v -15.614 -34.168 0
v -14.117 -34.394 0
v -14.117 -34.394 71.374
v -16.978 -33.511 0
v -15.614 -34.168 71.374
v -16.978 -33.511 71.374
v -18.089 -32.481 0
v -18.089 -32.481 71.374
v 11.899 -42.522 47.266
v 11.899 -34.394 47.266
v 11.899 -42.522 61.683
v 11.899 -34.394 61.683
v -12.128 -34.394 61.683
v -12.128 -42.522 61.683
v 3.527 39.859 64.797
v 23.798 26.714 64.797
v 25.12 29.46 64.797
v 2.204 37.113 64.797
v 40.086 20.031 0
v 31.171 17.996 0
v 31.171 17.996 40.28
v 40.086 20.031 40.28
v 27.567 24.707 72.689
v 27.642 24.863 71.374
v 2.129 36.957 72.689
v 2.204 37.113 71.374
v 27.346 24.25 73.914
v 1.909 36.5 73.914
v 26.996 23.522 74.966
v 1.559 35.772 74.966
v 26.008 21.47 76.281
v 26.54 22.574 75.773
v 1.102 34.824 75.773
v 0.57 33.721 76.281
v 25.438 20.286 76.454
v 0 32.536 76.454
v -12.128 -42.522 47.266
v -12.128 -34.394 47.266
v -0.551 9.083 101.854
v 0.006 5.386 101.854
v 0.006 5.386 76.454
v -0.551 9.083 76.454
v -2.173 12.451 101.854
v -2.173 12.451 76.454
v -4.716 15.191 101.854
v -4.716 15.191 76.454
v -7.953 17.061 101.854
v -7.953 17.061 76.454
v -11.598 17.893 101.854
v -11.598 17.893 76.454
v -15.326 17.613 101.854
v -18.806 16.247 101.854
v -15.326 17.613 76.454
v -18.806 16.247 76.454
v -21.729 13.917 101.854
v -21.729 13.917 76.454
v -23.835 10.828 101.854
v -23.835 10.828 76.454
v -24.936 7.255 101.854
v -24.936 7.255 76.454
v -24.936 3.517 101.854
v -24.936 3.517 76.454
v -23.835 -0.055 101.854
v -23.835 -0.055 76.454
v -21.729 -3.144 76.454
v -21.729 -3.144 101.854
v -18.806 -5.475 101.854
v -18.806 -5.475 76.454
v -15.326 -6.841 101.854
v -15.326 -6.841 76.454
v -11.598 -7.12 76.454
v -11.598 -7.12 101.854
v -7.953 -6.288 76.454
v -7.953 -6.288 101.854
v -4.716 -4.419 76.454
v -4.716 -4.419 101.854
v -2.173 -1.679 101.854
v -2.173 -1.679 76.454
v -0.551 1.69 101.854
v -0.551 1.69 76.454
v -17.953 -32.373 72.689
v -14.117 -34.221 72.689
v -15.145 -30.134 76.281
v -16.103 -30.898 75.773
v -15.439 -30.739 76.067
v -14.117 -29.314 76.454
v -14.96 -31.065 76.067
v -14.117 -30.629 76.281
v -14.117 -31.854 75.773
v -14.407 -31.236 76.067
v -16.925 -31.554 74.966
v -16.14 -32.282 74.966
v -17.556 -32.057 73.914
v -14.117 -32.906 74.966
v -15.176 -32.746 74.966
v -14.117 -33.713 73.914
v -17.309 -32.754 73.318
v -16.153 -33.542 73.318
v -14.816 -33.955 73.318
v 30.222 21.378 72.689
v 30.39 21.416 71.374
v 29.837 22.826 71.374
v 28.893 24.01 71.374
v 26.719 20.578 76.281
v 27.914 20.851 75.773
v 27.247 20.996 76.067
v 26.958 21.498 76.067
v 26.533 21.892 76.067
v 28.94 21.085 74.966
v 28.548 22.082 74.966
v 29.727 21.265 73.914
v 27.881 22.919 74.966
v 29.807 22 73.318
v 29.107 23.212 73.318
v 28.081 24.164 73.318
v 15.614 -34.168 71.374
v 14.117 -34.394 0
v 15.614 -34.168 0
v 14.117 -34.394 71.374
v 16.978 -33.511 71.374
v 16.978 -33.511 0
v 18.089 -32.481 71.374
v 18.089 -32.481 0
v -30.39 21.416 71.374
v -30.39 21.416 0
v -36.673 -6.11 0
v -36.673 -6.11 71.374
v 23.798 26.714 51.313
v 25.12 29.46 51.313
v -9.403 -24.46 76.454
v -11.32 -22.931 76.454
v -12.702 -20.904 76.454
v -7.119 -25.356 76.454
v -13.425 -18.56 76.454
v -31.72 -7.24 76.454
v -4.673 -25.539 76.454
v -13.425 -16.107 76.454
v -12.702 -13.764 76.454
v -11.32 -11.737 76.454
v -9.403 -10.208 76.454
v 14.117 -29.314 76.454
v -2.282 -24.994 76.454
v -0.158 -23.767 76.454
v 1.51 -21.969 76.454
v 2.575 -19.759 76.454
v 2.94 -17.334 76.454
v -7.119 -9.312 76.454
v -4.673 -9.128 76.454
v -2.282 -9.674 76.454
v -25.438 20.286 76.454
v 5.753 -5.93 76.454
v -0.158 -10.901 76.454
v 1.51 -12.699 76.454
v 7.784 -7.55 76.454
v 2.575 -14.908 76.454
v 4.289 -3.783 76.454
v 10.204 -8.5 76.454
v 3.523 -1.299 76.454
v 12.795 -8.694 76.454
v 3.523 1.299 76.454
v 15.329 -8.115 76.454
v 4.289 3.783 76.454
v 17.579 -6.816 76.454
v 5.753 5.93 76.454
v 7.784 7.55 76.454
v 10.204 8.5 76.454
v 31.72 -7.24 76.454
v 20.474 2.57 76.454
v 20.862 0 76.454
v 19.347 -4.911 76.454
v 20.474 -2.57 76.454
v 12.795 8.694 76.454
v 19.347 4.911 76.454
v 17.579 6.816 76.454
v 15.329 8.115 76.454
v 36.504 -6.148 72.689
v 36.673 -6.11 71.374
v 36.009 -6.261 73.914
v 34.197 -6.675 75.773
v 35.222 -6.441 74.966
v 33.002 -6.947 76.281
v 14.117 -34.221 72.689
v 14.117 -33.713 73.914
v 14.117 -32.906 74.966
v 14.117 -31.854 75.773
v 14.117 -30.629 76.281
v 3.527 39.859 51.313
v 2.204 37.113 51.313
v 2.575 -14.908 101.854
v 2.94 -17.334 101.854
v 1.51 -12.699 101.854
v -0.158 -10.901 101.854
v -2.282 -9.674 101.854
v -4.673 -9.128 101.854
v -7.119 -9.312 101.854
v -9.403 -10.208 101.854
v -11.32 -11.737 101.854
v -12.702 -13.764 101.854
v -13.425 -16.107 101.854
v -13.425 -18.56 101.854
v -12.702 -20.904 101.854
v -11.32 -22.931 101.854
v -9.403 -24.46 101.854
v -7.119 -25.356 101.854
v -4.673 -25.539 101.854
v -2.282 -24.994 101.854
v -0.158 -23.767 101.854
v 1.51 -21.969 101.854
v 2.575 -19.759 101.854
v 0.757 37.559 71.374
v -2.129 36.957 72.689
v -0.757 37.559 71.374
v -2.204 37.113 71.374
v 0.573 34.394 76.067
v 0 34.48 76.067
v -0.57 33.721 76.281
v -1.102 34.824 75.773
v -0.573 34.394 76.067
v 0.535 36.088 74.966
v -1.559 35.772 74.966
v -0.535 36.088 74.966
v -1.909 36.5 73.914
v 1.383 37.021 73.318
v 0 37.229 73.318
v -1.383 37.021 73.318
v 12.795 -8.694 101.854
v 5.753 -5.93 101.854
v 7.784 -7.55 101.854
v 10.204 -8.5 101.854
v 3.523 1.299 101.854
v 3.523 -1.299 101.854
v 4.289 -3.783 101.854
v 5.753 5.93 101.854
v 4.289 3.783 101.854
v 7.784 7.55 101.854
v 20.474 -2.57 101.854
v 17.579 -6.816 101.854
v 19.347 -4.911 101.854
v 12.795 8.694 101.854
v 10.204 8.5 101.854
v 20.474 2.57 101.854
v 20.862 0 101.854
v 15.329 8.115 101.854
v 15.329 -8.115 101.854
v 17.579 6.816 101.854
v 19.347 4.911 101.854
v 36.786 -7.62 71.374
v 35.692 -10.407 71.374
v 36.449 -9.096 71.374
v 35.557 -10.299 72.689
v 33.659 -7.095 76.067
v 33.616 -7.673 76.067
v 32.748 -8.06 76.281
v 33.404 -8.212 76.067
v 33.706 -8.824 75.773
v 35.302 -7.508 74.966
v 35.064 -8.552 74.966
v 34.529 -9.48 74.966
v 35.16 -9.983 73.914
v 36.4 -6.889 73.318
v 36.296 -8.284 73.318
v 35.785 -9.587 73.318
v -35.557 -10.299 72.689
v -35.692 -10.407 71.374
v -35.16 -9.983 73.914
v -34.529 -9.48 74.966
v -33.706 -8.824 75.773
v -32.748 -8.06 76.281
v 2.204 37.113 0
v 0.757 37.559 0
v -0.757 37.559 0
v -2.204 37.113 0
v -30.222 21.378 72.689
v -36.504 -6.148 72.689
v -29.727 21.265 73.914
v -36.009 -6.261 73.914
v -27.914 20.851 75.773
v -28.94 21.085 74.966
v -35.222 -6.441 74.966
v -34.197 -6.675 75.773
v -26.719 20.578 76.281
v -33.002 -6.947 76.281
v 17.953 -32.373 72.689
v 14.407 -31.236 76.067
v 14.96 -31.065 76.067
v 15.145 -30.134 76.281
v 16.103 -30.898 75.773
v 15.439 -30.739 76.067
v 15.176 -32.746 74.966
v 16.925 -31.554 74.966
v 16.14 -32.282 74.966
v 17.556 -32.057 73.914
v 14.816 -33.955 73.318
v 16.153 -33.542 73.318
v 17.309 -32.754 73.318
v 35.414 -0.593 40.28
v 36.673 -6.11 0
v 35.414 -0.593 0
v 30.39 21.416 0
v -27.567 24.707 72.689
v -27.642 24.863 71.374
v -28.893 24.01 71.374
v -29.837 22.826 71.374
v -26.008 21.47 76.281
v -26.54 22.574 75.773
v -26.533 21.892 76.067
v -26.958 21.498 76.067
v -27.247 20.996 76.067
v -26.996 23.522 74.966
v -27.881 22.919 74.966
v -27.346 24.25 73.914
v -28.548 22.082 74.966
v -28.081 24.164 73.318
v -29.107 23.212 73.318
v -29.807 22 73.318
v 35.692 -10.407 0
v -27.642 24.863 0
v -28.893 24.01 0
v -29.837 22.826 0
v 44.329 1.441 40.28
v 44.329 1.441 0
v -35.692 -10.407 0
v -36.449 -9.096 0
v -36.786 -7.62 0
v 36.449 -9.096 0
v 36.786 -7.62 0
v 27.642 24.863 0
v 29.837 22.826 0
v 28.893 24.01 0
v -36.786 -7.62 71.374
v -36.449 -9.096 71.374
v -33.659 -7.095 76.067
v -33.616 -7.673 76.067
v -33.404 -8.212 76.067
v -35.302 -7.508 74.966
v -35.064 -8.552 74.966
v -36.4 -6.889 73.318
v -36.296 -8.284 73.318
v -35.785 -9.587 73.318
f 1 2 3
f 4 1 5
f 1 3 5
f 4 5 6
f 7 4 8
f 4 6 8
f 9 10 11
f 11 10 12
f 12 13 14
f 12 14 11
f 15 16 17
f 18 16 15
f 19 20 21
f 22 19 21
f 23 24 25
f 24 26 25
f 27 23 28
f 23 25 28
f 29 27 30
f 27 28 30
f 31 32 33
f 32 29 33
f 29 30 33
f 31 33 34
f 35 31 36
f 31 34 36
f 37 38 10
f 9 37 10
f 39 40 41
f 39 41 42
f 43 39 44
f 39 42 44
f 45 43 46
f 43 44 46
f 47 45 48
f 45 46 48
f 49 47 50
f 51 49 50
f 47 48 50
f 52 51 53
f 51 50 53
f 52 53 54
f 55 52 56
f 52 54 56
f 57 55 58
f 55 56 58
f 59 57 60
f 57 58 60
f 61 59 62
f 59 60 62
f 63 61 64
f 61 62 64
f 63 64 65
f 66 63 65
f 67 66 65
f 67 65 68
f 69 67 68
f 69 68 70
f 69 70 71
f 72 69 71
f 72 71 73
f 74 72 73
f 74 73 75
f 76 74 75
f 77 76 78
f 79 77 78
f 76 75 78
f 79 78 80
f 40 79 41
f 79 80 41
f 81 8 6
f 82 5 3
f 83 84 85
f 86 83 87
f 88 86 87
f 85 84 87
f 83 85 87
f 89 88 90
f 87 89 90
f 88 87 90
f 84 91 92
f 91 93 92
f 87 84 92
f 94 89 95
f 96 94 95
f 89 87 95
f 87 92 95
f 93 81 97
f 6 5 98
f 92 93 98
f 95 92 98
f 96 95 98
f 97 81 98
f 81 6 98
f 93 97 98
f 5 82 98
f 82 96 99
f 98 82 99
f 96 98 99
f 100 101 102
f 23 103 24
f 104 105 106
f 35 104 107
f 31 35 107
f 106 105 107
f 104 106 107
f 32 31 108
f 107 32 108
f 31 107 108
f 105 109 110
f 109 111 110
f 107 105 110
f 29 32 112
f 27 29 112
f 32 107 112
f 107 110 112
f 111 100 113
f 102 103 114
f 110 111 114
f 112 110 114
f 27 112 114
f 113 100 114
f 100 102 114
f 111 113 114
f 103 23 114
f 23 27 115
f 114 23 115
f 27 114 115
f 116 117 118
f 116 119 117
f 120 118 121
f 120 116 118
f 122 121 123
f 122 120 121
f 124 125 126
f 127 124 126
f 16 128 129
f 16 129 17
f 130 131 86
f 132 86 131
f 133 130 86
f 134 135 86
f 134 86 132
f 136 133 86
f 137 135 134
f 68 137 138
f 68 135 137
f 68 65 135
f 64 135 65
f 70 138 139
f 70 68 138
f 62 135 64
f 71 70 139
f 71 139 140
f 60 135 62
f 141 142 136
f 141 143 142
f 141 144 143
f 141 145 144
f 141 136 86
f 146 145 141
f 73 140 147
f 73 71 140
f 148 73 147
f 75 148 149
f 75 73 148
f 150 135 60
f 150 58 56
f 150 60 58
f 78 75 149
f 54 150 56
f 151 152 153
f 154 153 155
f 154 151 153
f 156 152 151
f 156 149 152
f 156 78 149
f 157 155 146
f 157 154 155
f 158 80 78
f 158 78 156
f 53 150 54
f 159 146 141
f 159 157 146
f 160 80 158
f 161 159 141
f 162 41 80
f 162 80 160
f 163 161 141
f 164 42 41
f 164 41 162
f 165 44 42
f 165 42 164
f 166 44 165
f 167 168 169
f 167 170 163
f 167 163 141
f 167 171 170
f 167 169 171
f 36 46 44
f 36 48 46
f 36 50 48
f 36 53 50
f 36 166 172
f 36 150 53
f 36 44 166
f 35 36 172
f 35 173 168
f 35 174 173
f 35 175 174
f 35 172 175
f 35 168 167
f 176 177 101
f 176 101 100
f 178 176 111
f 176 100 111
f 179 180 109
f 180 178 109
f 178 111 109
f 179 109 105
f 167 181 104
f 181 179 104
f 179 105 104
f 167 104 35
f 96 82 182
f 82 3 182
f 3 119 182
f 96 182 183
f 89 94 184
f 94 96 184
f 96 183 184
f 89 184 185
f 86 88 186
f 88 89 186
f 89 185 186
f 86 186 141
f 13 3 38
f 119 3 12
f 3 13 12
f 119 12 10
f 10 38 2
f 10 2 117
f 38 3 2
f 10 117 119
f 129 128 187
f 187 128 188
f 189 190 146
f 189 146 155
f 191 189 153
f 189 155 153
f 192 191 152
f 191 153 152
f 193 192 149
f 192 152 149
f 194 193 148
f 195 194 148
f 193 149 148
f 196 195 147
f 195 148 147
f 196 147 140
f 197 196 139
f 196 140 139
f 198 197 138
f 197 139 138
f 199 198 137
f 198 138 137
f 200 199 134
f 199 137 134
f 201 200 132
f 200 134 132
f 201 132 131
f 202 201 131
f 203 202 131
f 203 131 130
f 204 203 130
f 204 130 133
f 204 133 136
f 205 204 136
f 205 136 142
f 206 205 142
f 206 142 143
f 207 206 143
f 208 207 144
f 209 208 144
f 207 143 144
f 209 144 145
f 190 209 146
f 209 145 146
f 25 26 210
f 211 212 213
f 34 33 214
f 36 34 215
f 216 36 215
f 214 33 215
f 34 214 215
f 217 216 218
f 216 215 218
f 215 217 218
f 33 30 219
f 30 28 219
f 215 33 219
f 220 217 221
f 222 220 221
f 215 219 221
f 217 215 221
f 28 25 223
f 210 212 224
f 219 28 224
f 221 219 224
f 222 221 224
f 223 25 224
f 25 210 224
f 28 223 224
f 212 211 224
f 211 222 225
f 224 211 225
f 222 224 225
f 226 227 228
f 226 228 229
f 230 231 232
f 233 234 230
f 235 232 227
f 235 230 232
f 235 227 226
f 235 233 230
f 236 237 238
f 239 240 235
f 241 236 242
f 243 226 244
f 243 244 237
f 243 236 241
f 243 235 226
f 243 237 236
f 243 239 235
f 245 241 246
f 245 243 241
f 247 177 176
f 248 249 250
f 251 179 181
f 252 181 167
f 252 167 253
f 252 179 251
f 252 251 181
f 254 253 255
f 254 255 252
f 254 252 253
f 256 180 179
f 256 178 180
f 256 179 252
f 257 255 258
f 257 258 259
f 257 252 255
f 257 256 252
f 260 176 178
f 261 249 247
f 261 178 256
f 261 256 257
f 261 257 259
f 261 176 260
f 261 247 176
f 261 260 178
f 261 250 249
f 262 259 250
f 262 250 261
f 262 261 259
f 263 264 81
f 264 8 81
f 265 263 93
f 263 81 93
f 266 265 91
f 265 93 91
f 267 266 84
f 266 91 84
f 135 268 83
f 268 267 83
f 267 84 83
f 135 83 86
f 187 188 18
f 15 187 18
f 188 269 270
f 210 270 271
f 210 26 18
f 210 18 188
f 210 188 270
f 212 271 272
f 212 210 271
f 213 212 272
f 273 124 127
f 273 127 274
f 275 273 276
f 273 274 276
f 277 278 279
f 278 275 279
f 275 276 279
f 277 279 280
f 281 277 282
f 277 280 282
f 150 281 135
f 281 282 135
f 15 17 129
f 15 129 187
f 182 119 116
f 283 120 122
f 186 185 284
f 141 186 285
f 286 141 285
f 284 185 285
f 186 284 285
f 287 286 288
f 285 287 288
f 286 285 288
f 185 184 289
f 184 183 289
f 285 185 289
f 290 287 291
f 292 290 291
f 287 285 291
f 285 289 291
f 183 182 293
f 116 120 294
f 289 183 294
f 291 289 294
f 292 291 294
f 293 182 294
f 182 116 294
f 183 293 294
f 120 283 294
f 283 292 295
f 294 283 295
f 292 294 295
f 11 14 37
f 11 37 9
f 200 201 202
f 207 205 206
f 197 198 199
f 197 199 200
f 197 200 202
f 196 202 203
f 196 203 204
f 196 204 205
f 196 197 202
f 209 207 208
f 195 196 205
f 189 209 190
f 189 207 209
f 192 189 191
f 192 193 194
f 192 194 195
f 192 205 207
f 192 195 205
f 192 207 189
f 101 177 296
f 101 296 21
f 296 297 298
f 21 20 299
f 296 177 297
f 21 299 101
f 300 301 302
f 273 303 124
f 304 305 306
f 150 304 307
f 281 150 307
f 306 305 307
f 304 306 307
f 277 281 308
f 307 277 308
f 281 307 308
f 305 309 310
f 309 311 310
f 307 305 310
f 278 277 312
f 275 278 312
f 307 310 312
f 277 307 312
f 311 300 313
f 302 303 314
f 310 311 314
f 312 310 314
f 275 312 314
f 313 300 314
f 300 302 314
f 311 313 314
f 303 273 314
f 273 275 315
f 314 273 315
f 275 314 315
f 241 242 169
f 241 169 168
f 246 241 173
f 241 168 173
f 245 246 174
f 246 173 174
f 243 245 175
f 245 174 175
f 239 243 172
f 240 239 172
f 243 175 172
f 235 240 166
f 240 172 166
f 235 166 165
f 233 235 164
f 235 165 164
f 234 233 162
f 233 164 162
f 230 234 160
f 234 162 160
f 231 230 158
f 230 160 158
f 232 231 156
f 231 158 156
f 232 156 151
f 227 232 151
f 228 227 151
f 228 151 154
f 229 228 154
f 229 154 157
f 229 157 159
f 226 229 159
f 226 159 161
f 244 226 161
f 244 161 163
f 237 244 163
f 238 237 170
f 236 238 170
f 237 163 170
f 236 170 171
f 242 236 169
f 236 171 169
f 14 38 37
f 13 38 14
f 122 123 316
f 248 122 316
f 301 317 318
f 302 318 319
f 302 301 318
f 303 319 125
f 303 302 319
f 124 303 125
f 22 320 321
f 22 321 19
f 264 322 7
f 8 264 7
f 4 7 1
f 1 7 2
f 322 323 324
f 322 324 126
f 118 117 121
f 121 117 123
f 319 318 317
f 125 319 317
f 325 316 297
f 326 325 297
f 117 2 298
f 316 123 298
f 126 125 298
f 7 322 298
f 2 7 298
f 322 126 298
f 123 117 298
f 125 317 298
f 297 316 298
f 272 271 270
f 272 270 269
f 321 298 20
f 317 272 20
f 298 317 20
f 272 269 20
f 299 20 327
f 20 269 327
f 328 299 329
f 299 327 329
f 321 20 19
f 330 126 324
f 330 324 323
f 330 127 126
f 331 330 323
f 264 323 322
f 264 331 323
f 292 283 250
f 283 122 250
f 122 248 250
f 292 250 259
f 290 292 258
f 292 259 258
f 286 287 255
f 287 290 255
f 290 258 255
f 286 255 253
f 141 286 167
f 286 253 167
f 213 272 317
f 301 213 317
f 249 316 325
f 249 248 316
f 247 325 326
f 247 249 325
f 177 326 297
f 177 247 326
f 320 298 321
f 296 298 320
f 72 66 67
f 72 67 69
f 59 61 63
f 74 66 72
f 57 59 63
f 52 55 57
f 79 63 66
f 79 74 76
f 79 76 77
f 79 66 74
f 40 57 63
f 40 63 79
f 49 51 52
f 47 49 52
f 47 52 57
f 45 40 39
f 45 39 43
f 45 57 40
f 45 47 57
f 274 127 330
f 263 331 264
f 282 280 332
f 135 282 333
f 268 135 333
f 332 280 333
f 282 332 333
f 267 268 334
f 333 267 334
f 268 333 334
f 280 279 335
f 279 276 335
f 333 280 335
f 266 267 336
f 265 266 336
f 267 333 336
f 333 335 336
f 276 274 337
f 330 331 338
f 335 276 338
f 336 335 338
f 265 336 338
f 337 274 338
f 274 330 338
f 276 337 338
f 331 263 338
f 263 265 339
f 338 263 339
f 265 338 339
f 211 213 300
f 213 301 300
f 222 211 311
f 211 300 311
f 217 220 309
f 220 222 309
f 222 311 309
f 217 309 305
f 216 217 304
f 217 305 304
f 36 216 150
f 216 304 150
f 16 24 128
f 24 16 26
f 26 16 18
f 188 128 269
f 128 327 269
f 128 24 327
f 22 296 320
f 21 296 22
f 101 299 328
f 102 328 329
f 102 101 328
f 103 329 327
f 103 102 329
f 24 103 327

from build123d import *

# Parameters (mm, degrees)
F1_DEPTH  = 76.454
F2_R      = 5.08
F3_R      = 12.5413462947
F3_R_2    = 8.7181007295
F3_R_3    = 8.2285725293
F4_DEPTH  = 25.4
F5_W      = 19.0680492669
F5_H      = 40.280263871
F6_DEPTH  = 9.144
F7_W      = 23.966927348
F7_H      = 13.4842246771
F8_DEPTH  = 3.048
F9_R      = 2.3003367046
F10_DEPTH = 5.334
F11_W     = 24.0274826065
F11_H     = 14.4164860249
F12_DEPTH = 8.128


with BuildPart() as f1:
    # F0 (on Top) → F1 (new body)
    with BuildSketch(Plane.XY):
        Polygon((-16.5632220721, -34.393885029), (16.5632220721, -34.393885029), (37.217222168, -8.4945880948), (29.8458948783, 23.8013069328), (0, 38.1743323818), (-29.8458948783, 23.8013069328), (-37.217222168, -8.4945880948), align=None)
    extrude(amount=F1_DEPTH)

    # F2
    f2_edges = [f1.edges().sort_by_distance(p)[0] for p in [
        (33.531559, 7.653359, 76.454),
        (14.922947, 30.98782, 76.454),
        (-14.922947, 30.98782, 76.454),
        (-33.531559, 7.653359, 76.454),
        (-26.890222, -21.444237, 76.454),
        (0, -34.393885, 76.454),
        (26.890222, -21.444237, 76.454),
        (29.845895, 23.801307, 38.227),
        (0, 38.174332, 38.227),
        (37.217222, -8.494588, 38.227),
        (16.563222, -34.393885, 38.227),
        (-29.845895, 23.801307, 38.227),
        (-37.217222, -8.494588, 38.227),
        (-16.563222, -34.393885, 38.227),
    ]]
    fillet(f2_edges, radius=F2_R)

    # F3 (on face) → F4 (join)
    with BuildSketch(Plane.XY.offset(76.454)):
        with Locations((-12.5352265313, 5.3862300701)):
            Circle(F3_R)
        with Locations((12.1435020119, 0)):
            Circle(F3_R_2)
        with Locations((-5.2882982418, -17.333868891)):
            Circle(F3_R_3)
    extrude(amount=F4_DEPTH)

    # F5 (on face) → F6 (join)
    with BuildSketch(Plane(origin=(33.5315585231, 7.653359419, 0), x_dir=(-0.222520934, 0.9749279122, 0), z_dir=(0.9749279122, 0.222520934, 0))):
        with Locations((1.0750833899, 20.1401319355)):
            Rectangle(F5_W, F5_H)
    extrude(amount=F6_DEPTH)

    # F7 (on face) → F8 (join)
    with BuildSketch(Plane(origin=(14.9229474392, 30.9878196573, 0), x_dir=(-0.9009688679, 0.4338837391, 0), z_dir=(0.4338837391, 0.9009688679, 0))):
        with Locations((2.1333593346, 58.0553635955)):
            Rectangle(F7_W, F7_H)
    extrude(amount=F8_DEPTH)

    # F9 (on face) → F10 (join)
    with BuildSketch(Plane(origin=(42.4462993521, 9.6880908391, 0), x_dir=(-0.222520934, 0.9749279122, 0), z_dir=(0.9749279122, 0.222520934, 0))):
        with Locations((3.9111254737, 19.3487424403)):
            Circle(F9_R)
    extrude(amount=-F10_DEPTH)

    # F11 (on face) → F12 (join)
    with BuildSketch(Plane.XZ.offset(34.393885029)):
        with Locations((-0.1144171692, 54.4746331871)):
            Rectangle(F11_W, F11_H)
    extrude(amount=F12_DEPTH)


solid = f1.part
